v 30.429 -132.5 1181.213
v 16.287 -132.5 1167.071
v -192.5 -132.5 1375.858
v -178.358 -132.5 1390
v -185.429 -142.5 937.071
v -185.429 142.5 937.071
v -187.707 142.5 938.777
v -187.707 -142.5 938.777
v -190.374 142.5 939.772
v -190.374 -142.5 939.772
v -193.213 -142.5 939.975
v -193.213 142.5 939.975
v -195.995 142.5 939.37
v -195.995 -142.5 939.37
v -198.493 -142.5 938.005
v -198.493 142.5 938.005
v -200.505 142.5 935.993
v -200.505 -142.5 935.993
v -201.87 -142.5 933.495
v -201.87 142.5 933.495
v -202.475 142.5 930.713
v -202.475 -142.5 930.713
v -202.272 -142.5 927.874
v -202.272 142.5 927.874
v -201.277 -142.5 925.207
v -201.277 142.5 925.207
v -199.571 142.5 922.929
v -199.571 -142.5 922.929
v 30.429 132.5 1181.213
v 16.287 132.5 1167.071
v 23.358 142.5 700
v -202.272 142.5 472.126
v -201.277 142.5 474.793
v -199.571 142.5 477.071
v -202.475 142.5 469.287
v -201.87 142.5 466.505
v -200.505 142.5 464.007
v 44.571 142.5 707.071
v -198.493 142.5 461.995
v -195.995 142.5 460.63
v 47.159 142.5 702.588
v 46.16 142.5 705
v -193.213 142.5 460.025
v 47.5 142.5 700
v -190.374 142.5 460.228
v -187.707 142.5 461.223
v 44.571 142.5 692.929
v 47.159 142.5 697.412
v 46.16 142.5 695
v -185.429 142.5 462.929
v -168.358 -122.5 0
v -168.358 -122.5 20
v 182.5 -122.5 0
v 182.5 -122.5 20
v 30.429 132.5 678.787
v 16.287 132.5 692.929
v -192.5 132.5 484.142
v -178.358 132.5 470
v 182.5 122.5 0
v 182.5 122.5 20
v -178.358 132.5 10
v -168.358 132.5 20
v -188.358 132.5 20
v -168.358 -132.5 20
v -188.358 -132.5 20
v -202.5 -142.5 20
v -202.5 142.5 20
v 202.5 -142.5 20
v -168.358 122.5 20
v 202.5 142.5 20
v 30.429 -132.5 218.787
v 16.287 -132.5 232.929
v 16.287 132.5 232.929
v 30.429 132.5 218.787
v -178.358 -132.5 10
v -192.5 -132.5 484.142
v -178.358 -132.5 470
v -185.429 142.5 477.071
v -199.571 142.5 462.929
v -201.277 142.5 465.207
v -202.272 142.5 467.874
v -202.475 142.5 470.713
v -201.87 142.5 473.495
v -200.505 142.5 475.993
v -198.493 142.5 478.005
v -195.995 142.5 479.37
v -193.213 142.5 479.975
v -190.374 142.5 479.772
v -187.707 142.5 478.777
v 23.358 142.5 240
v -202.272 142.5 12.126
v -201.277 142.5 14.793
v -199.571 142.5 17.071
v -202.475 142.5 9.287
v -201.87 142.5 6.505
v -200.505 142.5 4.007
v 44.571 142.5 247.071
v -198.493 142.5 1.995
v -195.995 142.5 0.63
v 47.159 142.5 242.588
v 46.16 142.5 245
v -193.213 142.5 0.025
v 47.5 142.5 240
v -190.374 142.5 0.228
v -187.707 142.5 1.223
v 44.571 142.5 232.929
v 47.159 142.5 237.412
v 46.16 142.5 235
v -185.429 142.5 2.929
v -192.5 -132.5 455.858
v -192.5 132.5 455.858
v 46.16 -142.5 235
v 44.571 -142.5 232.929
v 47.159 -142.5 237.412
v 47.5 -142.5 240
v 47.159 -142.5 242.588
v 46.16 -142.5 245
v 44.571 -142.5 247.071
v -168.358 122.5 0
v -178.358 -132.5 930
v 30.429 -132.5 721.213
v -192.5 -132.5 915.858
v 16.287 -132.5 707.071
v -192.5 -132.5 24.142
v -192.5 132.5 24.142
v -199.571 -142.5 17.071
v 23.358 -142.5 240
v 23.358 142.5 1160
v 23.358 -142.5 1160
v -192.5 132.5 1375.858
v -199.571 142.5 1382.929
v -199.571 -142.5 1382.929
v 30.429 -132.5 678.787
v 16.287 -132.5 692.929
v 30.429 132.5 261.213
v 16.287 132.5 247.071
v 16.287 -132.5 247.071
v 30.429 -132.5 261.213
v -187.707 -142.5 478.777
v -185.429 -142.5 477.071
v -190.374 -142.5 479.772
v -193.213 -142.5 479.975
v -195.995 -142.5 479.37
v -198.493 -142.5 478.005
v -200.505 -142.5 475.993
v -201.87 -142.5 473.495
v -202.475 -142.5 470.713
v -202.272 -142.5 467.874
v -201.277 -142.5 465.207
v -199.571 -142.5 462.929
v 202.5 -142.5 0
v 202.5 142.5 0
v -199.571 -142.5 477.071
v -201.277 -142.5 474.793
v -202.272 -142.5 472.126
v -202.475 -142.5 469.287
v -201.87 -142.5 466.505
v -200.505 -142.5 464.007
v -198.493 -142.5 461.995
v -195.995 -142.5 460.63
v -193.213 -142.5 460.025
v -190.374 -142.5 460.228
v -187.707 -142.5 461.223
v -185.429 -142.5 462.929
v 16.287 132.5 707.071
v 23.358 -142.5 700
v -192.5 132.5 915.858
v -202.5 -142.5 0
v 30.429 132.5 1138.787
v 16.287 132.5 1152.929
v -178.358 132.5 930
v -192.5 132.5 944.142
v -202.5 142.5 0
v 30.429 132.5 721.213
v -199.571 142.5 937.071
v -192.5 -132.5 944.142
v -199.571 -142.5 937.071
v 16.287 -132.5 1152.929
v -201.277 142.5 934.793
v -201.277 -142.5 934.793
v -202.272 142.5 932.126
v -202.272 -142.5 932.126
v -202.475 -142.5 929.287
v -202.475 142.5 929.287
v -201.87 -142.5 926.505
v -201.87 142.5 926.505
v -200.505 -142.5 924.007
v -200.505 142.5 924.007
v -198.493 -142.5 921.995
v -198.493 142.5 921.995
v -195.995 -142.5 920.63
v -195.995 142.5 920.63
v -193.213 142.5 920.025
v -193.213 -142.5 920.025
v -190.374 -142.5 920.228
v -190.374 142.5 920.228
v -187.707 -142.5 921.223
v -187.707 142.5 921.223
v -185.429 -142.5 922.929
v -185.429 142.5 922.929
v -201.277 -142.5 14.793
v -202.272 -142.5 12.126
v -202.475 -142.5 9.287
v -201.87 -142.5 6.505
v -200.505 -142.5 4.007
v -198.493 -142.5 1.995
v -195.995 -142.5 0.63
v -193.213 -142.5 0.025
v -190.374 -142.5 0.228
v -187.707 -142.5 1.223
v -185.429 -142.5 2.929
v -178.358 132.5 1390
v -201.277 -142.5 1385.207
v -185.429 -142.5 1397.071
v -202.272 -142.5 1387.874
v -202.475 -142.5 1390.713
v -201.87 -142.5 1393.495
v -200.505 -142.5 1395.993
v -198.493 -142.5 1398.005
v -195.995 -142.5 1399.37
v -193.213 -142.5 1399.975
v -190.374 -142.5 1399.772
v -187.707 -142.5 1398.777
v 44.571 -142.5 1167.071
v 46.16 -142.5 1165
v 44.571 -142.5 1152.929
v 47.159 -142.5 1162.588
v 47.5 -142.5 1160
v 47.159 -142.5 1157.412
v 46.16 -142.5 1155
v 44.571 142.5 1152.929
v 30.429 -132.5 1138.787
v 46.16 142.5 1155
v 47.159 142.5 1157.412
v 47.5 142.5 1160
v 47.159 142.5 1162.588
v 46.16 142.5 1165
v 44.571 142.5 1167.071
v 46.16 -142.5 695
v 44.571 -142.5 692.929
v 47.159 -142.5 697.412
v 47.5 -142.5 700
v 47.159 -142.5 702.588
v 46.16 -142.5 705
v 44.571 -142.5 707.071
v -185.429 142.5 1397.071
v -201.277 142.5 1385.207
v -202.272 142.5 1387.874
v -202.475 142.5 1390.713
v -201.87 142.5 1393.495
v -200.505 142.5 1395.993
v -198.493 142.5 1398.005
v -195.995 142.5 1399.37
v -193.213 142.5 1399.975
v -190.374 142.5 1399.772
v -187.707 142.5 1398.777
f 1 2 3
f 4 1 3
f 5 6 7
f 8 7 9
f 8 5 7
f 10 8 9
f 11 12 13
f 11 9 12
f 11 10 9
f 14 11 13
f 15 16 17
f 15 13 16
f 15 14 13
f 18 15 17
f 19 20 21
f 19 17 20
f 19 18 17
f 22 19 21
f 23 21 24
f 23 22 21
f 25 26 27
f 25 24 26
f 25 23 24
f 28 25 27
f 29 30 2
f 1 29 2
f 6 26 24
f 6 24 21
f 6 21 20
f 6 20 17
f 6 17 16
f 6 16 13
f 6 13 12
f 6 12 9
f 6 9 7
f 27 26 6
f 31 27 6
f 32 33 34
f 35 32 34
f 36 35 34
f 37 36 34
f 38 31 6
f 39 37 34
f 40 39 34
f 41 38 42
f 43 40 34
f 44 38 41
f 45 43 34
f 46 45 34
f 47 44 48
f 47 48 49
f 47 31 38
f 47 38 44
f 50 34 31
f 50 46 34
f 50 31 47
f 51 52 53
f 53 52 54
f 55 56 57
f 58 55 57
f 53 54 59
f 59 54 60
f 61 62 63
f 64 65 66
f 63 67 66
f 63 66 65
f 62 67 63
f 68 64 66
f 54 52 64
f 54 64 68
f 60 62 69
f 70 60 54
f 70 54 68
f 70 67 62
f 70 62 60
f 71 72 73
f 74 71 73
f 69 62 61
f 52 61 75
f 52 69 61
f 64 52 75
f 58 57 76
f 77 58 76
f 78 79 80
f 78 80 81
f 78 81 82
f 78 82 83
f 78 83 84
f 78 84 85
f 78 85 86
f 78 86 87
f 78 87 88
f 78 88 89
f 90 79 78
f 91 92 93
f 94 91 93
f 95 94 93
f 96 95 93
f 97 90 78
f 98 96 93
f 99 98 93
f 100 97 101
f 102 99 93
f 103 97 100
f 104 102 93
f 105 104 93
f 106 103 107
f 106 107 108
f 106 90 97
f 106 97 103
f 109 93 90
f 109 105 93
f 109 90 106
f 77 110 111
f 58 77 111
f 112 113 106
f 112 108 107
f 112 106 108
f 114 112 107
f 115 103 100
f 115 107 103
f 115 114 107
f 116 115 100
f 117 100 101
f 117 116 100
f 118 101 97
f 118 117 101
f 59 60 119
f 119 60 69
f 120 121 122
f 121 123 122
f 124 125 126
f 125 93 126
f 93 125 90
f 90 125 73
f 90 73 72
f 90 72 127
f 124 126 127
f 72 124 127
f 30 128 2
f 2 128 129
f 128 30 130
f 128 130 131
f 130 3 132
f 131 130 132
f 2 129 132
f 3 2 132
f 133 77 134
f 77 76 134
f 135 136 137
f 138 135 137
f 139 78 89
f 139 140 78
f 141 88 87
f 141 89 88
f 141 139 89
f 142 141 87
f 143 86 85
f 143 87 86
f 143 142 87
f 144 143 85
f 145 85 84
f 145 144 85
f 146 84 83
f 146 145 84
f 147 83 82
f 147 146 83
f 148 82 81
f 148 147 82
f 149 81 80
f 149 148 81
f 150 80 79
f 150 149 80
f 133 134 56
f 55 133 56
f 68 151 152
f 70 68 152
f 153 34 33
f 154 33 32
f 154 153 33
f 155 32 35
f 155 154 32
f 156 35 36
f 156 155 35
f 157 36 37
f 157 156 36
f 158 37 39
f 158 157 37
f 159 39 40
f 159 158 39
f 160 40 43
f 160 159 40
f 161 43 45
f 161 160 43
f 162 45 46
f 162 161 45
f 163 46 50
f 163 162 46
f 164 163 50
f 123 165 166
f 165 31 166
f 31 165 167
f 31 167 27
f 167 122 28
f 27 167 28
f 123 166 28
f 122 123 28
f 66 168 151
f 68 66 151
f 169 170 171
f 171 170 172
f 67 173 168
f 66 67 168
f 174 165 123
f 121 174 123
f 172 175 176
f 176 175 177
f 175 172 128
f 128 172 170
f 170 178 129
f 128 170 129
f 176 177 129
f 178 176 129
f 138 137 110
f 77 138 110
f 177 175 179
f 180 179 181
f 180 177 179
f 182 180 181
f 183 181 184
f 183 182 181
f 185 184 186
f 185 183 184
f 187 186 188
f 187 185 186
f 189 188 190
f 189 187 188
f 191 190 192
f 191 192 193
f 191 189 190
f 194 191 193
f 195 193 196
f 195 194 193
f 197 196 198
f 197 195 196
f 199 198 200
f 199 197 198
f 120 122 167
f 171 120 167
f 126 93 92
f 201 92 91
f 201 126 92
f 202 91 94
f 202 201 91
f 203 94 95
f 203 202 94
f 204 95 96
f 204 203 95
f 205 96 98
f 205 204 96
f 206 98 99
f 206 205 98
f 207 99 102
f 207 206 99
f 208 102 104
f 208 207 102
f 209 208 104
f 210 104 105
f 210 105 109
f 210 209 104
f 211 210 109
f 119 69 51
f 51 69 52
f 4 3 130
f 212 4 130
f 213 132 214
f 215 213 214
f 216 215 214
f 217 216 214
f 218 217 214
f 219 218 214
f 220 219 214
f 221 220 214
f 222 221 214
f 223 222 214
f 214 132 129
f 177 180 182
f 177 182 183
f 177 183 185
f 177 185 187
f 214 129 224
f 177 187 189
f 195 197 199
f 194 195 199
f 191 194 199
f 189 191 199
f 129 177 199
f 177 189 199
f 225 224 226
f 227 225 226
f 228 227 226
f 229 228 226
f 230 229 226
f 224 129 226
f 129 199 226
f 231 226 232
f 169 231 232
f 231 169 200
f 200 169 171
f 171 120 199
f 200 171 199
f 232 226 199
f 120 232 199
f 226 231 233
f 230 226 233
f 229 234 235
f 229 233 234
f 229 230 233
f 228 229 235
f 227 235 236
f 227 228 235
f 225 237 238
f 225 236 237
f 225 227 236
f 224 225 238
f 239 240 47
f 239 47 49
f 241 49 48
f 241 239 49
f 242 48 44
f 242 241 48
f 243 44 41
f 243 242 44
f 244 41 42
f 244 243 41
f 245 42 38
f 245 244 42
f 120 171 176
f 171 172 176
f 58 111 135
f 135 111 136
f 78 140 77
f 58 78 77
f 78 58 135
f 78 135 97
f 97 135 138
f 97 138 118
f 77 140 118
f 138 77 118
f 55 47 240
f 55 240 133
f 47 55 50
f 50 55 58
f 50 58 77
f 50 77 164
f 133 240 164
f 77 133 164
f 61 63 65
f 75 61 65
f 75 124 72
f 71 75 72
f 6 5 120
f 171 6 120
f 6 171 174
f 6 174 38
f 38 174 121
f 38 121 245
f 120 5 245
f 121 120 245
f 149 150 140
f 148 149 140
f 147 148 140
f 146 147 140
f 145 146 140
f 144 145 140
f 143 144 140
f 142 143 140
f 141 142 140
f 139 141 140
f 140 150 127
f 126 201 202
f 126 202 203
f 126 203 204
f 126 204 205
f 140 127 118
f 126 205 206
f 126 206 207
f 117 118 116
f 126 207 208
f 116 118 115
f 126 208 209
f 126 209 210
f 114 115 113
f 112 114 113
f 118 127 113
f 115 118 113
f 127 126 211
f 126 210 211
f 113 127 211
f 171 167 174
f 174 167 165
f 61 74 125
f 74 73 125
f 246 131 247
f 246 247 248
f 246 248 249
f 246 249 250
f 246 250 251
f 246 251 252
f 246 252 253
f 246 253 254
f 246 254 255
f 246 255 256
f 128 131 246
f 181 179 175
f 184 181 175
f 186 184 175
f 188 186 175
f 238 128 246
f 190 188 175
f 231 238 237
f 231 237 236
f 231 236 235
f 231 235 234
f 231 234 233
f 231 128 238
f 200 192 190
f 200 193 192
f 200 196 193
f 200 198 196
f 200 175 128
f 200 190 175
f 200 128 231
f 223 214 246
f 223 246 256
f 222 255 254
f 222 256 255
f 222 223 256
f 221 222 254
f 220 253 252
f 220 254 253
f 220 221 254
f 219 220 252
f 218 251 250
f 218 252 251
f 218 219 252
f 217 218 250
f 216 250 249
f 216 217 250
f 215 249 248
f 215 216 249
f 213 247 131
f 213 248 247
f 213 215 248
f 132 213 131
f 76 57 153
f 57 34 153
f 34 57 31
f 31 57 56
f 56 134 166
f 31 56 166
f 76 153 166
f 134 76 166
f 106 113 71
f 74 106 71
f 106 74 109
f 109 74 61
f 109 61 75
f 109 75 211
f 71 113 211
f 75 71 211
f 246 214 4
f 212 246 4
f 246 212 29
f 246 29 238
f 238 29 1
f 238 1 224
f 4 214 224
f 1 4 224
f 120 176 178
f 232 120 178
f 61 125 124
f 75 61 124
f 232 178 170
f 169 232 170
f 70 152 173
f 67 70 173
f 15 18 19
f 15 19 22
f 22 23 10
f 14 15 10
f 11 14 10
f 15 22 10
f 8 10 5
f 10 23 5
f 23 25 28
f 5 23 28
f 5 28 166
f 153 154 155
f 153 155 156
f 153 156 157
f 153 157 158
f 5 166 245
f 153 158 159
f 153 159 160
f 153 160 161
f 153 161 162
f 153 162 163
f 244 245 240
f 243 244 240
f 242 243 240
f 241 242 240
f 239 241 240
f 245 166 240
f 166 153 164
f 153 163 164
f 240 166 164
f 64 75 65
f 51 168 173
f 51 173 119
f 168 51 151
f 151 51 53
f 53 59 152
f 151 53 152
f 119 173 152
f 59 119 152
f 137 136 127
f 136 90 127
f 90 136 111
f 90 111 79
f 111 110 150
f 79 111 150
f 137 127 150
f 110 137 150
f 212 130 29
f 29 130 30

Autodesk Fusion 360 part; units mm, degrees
sketch "Sketch1" plane through (0, 0, 0) normal (0, 0, 1) x (1, 0, 0)
  line L0 (-202.5, -142.5) -> (202.5, -142.5)
  line L1 (202.5, -142.5) -> (202.5, 142.5)
  line L2 (202.5, 142.5) -> (-202.5, 142.5)
  line L3 (-202.5, 142.5) -> (-202.5, -142.5)
  line L4 (-202.5, -142.5) -> (202.5, 142.5) construction
  line L5 (202.5, -142.5) -> (-202.5, 142.5) construction
  dimension "d1" = 405
  dimension "d2" = 285
extrude "Extrude1" add sketch "Sketch1" along normal blind 20 makes body 1
sketch "Sketch2" plane through (0, 0, 0) normal (0, 1, 0) x (1, 0, 0)
  line L0 (44.5711, -232.9289) -> (-185.4289, -2.9289)
  arc A0 (-185.4289, -2.9289) -> (-199.5711, -17.0711) centre (-192.5, -10) ccw
  line L1 (-199.5711, -17.0711) -> (30.4289, -247.0711)
  arc A1 (30.4289, -247.0711) -> (44.5711, -232.9289) centre (37.5, -240) ccw
  line L2 (37.5, -240) -> (-192.5, -10) construction
  line L3 (202.5, 0) -> (-202.5, 0)
  line L4 (-202.5, 0) -> (-202.5, -20)
  line L5 (30.4289, -232.9289) -> (-199.5711, -462.9289)
  arc A2 (-199.5711, -462.9289) -> (-185.4289, -477.0711) centre (-192.5, -470) ccw
  line L6 (-185.4289, -477.0711) -> (44.5711, -247.0711)
  arc A3 (44.5711, -247.0711) -> (30.4289, -232.9289) centre (37.5, -240) ccw
  line L7 (37.5, -240) -> (-192.5, -470) construction
  point P0 (-192.5, -10)
  point P1 (37.5, -240)
  dimension "d5" = 20
  dimension "d7" = 10
  dimension "d8" = 10
  dimension "d9" = 230
  dimension "d10" = 230
  dimension "d11" = 10
  dimension "d12" = 230
  dimension "d13" = 230
extrude "Extrude2" add sketch "Sketch2" along normal up to surface (142.5 mm away) and the other way up to surface (142.5 mm away) separate body contours L0 A0 L1 L5 A3 | L1 A1 L5 A3 | L1 A1 L5 A2 L6 makes body 2
sketch "Sketch3" plane through (-108.3211, 0, 108.3211) normal (-0.7071, 0, 0.7071) x (0, -1, 0)
  line L0 (-142.5, 186.2221) -> (-142.5, -129.047)
  line L1 (-142.5, -129.047) -> (142.5, -129.047)
  line L2 (142.5, -129.047) -> (142.5, 186.2221)
  line L3 (142.5, 186.2221) -> (-142.5, 186.2221)
  line L4 (-132.5, -119.047) -> (132.5, -119.047)
  line L5 (132.5, -119.047) -> (132.5, 176.2221)
  line L6 (132.5, 176.2221) -> (-132.5, 176.2221)
  line L7 (-132.5, 176.2221) -> (-132.5, -119.047)
  dimension "d18" = -10
extrude "Extrude3" cut sketch "Sketch3" against normal up to surface (20 mm away) contours L4 L5 L6 L7 bodies 1 2
sketch "Sketch4" plane through (131.6789, 0, 131.6789) normal (-0.7071, 0, -0.7071) x (0, -1, 0)
  line L0 (-142.5, 468.4582) -> (-142.5, 153.1891)
  line L1 (-142.5, 153.1891) -> (142.5, 153.1891)
  line L2 (142.5, 153.1891) -> (142.5, 468.4582)
  line L3 (142.5, 468.4582) -> (-142.5, 468.4582)
  line L4 (-132.5, 163.1891) -> (132.5, 163.1891)
  line L5 (132.5, 163.1891) -> (132.5, 458.4582)
  line L6 (132.5, 458.4582) -> (-132.5, 458.4582)
  line L7 (-132.5, 458.4582) -> (-132.5, 163.1891)
  dimension "d21" = -10
extrude "Extrude4" cut sketch "Sketch4" against normal up to surface (20 mm away) contours L4 L5 L6 L7 bodies 2
pattern_linear "R-Pattern1" count 3 spacing 460 along (0, 0, 1) of bodies 2 makes body 3 at (39.857, -44.1667, 688.2149) makes body 4 at (39.857, 44.1667, 1171.7851)
sketch "Sketch5" plane through (0, 0, 20) normal (0, 0, 1) x (-1, 0, 0)
  line L0 (188.3579, -132.5) -> (168.3579, -132.5)
  line L1 (168.3579, -132.5) -> (168.3579, 132.5)
  line L2 (168.3579, 132.5) -> (188.3579, 132.5)
  line L3 (188.3579, 132.5) -> (188.3579, -132.5)
  line L4 (202.5, -142.5) -> (202.5, 142.5)
  line L5 (202.5, 142.5) -> (-202.5, 142.5)
  line L6 (-202.5, 142.5) -> (-202.5, -142.5)
  line L7 (-202.5, -142.5) -> (202.5, -142.5)
  line L8 (182.5, 122.5) -> (-182.5, 122.5)
  line L9 (-182.5, 122.5) -> (-182.5, -122.5)
  line L10 (-182.5, -122.5) -> (182.5, -122.5)
  line L11 (182.5, -122.5) -> (182.5, 122.5)
  dimension "d28" = -20
extrude "Extrude5" cut sketch "Sketch5" against normal up to surface (20 mm away) contours L1 L8 L9 L10 bodies 1
